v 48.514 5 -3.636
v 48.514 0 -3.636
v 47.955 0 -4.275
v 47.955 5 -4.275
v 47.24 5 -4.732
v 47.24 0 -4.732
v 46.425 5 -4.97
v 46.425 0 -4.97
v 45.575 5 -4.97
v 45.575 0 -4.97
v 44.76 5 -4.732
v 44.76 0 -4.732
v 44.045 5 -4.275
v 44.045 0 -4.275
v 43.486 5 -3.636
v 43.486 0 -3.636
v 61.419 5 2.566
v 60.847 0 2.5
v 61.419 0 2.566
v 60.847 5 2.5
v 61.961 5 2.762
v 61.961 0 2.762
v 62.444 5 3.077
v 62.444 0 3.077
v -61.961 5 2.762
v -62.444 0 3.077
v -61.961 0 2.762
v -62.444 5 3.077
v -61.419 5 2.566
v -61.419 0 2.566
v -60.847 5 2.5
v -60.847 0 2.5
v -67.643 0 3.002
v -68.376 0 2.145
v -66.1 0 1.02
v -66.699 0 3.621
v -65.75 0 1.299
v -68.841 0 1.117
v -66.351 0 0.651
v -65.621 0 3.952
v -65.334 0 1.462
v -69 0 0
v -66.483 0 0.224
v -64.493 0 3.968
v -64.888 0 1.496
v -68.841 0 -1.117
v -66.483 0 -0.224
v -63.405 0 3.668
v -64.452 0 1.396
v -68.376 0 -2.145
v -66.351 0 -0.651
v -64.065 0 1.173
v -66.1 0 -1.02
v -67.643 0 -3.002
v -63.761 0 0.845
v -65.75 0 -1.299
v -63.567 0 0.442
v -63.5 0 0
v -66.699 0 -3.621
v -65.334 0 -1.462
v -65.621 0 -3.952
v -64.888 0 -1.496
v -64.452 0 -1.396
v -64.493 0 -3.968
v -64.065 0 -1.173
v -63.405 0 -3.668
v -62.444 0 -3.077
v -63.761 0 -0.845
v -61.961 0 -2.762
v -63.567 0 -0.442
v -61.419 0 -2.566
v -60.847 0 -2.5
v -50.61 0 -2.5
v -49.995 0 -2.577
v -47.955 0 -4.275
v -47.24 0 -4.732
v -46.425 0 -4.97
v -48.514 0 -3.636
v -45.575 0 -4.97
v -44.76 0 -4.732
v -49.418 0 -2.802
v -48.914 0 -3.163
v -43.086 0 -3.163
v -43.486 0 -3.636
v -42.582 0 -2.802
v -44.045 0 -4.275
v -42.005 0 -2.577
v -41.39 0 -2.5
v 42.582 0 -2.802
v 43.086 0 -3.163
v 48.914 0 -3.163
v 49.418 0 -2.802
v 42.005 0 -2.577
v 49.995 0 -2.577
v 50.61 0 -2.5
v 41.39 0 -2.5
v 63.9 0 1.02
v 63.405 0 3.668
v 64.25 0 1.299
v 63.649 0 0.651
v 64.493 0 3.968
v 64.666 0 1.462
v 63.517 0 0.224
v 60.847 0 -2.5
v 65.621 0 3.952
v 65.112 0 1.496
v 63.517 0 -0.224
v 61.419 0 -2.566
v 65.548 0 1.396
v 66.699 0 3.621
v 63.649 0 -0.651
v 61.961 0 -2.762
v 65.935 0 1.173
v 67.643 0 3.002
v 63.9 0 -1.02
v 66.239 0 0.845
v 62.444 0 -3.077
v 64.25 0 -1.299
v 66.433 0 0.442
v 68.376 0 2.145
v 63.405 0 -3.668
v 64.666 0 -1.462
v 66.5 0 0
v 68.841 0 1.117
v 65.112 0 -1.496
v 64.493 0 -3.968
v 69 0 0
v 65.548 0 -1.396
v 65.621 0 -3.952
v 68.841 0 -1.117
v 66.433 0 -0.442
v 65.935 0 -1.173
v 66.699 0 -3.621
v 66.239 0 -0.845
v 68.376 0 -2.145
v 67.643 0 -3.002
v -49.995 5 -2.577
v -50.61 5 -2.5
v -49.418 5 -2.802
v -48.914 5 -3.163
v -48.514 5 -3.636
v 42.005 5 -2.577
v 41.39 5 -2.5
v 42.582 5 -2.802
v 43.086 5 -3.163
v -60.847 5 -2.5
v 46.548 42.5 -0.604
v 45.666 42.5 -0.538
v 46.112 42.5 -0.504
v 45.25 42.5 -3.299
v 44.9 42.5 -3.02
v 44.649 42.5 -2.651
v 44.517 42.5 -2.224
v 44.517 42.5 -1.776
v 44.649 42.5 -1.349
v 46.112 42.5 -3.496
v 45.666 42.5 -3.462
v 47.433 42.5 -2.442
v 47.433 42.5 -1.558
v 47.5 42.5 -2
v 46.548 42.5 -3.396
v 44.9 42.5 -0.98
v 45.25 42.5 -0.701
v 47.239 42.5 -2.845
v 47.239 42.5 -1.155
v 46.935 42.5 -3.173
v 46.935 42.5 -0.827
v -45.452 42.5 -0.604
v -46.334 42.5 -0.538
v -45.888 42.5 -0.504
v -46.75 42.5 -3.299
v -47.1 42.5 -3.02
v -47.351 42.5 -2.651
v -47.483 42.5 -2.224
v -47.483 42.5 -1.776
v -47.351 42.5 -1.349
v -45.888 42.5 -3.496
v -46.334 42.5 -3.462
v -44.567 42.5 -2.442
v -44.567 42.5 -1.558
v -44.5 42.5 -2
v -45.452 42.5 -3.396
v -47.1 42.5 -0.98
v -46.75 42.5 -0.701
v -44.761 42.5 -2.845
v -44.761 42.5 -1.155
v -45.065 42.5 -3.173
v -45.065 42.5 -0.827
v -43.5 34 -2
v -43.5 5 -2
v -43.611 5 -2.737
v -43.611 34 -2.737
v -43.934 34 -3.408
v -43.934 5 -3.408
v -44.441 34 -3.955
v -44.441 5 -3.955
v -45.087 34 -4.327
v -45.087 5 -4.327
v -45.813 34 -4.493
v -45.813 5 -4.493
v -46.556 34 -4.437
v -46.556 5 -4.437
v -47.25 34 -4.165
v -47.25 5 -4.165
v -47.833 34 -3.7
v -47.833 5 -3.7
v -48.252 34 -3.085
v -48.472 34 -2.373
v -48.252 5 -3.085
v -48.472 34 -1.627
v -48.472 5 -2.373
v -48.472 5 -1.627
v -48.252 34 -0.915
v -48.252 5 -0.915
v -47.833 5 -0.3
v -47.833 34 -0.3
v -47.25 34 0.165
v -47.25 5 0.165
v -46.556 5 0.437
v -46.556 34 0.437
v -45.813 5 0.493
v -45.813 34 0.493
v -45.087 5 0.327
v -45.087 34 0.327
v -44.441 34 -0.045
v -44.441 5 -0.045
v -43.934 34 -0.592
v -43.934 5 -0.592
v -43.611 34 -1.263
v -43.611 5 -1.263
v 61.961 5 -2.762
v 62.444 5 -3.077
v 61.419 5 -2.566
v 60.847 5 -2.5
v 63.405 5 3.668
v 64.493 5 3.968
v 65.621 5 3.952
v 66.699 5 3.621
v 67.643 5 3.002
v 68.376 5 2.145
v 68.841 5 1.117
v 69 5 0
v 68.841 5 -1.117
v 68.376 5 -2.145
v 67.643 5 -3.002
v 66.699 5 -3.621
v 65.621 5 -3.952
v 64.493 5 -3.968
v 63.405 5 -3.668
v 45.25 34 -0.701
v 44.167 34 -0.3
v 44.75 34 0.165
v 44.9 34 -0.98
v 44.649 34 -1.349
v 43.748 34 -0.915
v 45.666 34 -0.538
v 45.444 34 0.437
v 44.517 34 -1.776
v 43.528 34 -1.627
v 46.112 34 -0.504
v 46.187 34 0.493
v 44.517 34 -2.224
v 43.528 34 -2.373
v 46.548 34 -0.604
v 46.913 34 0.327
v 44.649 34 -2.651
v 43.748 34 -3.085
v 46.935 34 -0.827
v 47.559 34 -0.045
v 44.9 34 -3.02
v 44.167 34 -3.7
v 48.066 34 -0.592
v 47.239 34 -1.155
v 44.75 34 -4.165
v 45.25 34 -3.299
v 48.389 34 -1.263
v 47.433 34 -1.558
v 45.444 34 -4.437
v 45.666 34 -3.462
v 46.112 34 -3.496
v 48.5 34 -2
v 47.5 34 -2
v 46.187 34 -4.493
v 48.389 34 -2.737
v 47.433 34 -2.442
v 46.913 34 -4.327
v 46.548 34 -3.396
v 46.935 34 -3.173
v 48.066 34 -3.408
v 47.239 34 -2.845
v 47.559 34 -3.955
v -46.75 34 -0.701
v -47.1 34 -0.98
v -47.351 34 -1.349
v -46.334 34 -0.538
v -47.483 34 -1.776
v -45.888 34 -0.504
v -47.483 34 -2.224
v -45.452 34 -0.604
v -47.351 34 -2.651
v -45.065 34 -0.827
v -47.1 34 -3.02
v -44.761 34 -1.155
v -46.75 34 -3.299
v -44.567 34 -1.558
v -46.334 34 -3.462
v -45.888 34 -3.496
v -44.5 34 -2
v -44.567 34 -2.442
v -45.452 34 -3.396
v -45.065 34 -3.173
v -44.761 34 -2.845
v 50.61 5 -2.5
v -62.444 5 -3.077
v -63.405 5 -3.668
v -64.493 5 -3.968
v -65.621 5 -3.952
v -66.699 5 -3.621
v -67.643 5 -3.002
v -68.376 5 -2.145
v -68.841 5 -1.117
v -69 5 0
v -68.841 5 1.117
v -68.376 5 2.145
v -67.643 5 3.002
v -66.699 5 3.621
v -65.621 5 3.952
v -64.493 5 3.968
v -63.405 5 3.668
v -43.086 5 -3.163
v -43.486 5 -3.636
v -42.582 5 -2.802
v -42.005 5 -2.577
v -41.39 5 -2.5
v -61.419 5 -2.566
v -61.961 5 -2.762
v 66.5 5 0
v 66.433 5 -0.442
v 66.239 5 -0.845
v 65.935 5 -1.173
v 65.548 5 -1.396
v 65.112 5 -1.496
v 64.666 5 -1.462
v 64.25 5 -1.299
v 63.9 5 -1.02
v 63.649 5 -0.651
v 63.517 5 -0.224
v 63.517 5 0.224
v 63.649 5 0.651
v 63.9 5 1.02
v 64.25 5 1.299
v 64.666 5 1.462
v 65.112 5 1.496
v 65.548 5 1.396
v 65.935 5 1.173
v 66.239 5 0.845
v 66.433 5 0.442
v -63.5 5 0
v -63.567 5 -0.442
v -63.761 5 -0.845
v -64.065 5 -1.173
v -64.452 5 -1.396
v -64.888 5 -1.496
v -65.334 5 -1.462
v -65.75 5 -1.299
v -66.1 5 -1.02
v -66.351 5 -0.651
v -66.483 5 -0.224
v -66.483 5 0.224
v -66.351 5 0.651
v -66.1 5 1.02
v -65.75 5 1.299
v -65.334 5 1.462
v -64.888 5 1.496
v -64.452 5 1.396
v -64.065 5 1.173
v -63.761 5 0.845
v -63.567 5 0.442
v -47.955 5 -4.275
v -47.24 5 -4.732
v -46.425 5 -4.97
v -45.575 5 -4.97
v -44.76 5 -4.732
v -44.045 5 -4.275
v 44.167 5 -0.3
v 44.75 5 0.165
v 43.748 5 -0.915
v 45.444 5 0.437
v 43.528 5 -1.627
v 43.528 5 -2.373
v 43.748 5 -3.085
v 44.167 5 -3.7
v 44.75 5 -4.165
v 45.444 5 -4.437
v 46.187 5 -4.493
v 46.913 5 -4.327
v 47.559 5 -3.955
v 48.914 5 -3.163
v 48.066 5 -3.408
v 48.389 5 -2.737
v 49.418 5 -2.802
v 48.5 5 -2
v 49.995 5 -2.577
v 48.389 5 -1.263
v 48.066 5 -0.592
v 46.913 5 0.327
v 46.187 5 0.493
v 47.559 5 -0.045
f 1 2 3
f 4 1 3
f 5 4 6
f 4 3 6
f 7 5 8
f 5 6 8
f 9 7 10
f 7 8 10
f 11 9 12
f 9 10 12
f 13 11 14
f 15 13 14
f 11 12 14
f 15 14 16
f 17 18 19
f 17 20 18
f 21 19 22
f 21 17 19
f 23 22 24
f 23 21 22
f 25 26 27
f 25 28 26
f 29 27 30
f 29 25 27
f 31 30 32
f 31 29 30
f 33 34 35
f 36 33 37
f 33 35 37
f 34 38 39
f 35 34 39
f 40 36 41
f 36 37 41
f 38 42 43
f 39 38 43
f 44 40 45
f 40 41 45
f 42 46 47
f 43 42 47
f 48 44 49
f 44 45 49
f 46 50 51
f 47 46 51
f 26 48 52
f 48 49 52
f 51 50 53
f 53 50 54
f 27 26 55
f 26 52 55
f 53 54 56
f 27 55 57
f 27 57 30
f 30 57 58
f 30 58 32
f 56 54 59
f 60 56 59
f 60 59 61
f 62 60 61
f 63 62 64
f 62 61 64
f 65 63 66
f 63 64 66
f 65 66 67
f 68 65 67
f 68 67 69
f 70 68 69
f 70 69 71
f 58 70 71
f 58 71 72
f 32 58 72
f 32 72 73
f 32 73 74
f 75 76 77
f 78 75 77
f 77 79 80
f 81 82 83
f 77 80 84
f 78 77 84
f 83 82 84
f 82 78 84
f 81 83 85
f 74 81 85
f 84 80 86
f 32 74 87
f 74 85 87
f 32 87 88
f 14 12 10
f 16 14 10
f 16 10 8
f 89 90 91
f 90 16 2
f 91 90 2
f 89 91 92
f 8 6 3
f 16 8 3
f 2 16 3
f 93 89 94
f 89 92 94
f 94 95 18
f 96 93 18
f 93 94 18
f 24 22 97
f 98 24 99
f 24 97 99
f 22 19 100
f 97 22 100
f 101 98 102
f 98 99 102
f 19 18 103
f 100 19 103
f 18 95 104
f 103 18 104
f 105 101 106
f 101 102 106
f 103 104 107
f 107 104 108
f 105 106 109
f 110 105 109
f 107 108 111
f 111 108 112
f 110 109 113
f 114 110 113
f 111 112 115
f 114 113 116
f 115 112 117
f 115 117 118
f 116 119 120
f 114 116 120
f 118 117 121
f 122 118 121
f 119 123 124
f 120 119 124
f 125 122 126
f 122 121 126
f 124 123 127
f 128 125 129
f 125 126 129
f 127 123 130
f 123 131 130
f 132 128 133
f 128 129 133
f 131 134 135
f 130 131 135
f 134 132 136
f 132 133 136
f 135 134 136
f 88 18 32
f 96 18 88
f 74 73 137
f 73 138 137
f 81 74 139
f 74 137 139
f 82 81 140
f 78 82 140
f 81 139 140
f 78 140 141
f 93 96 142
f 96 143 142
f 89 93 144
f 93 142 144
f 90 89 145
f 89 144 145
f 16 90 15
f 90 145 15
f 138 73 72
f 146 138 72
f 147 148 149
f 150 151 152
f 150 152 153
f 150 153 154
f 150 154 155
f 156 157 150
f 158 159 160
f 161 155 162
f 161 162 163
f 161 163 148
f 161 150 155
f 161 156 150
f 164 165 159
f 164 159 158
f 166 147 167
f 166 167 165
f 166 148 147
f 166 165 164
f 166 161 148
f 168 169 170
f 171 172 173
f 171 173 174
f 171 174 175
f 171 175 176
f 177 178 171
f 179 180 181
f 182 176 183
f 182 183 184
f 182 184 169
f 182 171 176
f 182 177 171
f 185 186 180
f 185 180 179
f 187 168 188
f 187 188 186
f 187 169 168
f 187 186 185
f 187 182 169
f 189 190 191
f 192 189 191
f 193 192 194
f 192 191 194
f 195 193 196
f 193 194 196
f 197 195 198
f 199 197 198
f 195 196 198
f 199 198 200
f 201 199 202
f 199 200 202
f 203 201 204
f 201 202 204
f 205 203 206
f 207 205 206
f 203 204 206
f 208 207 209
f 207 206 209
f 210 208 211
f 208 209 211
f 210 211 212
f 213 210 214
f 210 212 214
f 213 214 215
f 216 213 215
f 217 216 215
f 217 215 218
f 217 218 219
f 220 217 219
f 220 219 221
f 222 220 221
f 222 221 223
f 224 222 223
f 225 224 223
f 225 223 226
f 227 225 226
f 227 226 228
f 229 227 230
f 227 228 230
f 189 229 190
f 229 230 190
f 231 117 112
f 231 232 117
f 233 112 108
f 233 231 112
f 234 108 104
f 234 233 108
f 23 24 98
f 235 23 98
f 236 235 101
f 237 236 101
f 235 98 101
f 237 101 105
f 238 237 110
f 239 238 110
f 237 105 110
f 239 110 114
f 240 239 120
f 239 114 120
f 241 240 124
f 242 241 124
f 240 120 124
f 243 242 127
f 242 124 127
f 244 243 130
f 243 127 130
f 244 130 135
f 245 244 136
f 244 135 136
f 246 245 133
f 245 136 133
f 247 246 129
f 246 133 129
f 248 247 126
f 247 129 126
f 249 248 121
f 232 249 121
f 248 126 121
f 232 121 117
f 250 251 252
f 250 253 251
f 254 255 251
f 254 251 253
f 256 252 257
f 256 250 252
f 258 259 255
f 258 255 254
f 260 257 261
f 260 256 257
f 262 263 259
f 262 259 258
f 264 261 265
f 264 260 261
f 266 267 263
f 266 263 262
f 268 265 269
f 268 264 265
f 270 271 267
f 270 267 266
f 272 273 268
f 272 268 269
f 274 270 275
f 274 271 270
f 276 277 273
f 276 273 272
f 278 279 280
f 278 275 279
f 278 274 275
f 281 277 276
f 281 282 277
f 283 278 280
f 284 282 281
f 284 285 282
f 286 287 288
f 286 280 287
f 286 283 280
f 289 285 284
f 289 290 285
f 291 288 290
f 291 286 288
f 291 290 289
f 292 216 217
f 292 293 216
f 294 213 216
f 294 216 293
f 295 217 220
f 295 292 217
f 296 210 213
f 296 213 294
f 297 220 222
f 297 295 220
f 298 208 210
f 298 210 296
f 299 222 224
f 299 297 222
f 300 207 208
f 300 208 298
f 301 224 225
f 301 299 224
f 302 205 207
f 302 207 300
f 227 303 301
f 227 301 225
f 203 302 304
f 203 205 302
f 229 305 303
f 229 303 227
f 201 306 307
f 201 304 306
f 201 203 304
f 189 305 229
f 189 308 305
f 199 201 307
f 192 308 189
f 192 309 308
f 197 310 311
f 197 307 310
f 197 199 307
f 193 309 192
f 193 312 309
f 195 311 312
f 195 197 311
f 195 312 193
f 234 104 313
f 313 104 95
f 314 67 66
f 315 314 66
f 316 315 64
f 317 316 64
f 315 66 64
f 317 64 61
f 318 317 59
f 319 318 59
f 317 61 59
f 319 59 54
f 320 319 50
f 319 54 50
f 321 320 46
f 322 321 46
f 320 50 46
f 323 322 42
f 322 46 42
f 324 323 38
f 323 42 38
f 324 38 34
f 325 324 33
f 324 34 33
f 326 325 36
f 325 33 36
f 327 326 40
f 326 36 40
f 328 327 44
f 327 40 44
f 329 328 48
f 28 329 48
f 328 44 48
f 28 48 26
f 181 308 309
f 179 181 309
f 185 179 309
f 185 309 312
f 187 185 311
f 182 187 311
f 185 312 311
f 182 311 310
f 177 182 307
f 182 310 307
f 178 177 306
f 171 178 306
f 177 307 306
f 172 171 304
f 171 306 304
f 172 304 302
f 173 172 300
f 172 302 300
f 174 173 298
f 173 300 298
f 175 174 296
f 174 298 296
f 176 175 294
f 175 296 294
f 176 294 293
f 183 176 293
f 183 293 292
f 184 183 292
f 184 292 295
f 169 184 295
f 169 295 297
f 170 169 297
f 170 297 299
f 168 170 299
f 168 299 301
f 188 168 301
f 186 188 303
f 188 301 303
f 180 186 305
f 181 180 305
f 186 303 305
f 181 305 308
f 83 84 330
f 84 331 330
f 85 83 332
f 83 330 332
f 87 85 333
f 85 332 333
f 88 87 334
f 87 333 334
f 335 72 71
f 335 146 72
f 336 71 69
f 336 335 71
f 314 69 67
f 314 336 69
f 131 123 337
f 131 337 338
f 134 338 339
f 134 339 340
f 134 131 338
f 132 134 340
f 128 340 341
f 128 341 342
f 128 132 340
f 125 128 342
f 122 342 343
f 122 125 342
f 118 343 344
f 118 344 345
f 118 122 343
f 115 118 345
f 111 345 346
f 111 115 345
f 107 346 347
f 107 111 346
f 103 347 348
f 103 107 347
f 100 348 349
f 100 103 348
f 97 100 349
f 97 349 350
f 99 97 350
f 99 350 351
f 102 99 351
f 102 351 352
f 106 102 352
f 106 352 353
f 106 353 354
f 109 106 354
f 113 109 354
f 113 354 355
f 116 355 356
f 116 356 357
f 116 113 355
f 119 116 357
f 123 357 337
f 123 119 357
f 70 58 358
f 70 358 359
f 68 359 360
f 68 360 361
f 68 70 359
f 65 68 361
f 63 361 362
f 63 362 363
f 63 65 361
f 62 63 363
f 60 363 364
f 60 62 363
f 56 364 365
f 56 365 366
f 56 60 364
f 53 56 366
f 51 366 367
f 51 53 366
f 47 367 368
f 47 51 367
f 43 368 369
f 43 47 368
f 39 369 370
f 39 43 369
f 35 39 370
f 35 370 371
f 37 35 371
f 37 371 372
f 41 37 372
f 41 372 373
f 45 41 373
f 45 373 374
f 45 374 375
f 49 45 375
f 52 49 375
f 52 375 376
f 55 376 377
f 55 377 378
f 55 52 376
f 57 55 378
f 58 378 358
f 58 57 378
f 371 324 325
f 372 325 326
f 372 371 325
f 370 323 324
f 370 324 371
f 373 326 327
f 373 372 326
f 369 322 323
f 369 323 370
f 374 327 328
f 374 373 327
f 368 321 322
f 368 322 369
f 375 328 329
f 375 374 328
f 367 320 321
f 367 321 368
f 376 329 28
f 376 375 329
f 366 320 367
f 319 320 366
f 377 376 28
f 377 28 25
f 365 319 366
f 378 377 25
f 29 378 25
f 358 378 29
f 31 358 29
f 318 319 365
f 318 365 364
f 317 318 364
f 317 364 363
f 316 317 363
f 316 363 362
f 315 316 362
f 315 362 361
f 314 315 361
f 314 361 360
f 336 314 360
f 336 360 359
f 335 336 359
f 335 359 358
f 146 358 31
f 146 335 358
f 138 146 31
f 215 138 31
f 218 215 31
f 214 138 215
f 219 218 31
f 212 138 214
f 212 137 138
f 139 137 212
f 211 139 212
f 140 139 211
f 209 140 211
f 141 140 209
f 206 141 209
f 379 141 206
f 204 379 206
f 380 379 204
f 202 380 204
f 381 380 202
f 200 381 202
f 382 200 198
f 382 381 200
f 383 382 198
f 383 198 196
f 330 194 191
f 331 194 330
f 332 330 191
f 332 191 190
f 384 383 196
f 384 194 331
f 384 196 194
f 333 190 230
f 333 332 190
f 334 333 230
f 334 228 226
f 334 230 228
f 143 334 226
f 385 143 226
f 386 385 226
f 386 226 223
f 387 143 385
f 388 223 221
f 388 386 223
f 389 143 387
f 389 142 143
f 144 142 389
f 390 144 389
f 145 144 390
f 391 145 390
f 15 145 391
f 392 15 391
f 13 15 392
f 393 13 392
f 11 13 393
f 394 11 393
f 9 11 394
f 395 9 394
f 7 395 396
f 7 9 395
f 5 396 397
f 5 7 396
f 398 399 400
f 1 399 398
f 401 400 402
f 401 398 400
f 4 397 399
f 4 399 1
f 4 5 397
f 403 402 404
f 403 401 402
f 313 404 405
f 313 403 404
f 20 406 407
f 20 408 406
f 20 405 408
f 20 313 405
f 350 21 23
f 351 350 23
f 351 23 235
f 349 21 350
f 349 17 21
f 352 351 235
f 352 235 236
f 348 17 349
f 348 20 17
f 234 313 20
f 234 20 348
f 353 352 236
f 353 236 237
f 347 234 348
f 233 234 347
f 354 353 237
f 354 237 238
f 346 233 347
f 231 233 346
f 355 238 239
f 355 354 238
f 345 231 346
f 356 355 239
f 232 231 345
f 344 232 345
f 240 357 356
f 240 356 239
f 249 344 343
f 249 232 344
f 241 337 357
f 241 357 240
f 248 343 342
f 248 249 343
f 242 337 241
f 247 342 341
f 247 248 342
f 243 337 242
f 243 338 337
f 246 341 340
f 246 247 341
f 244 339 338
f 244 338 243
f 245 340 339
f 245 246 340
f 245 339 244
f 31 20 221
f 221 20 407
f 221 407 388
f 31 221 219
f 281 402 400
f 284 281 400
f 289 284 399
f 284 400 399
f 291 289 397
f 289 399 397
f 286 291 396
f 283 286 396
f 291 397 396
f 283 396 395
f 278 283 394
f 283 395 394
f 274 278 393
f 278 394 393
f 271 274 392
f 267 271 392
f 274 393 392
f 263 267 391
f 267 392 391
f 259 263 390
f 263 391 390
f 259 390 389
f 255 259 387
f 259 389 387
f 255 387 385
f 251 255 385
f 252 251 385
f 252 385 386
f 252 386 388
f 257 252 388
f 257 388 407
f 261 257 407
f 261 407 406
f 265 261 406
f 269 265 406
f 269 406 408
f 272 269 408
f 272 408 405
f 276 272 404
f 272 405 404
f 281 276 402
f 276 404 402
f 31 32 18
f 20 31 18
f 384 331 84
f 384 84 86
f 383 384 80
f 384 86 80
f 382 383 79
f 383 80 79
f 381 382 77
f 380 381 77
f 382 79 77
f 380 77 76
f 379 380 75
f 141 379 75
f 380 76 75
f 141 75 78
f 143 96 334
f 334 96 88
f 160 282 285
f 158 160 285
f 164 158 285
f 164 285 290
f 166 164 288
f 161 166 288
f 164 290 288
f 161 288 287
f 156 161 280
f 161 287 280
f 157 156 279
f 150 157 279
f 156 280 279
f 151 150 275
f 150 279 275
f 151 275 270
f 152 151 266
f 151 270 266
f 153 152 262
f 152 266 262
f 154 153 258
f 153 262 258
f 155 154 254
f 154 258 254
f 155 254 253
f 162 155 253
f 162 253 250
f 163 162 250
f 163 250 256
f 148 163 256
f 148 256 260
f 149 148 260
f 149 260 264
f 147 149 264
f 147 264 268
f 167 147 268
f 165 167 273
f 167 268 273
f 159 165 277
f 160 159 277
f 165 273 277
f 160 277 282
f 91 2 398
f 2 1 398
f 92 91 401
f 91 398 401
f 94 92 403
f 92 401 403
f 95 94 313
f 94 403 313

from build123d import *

# Parameters (mm, degrees)
SKETCH1_R           = 1.5
BOSS_EXTRUDE1_DEPTH = 5
FILLET1_R           = 2.5
SKETCH2_R           = 2.5
BOSS_EXTRUDE2_DEPTH = 29
SKETCH3_R           = 1.5
BOSS_EXTRUDE3_DEPTH = 8.5


with BuildPart() as part:
    # Sketch1 → Boss-Extrude1 (new body)
    with BuildSketch(Plane(origin=(0, 0, 0), x_dir=(1, 0, 0), z_dir=(0, 1, 0))):
        with BuildLine():
            Line((-48.958039892, 2.5), (-61.877501001, 2.5))
            ThreePointArc((-61.877501001, 2.5), (-69, 0), (-61.877501001, -2.5))
            Line((-61.877501001, -2.5), (61.877501001, -2.5))
            ThreePointArc((61.877501001, -2.5), (69, 0), (61.877501001, 2.5))
            Line((61.877501001, 2.5), (48.958039892, 2.5))
            ThreePointArc((48.958039892, 2.5), (46, 5), (43.041960108, 2.5))
            Line((43.041960108, 2.5), (-43.041960108, 2.5))
            ThreePointArc((-43.041960108, 2.5), (-46, 5), (-48.958039892, 2.5))
        make_face()
        with Locations((-65, 0)):
            Circle(SKETCH1_R, mode=Mode.SUBTRACT)
        with Locations((65, 0)):
            Circle(SKETCH1_R, mode=Mode.SUBTRACT)
    extrude(amount=BOSS_EXTRUDE1_DEPTH)

    # Fillet1
    fillet1_edges = [part.edges().sort_by_distance(p)[0] for p in [
        (61.877501001, 2.5, -2.5),
        (61.877501001, 2.5, 2.5),
        (-61.877501001, 2.5, 2.5),
        (-61.877501001, 2.5, -2.5),
        (-48.958039892, 2.5, -2.5),
        (-43.041960108, 2.5, -2.5),
        (43.041960108, 2.5, -2.5),
        (48.958039892, 2.5, -2.5),
    ]]
    fillet(fillet1_edges, radius=FILLET1_R)

    # Sketch2 → Boss-Extrude2 (add)
    with BuildSketch(Plane(origin=(0, 5, 0), x_dir=(1, 0, 0), z_dir=(0, 1, 0))):
        with Locations((-46, 2)):
            Circle(SKETCH2_R)
        with Locations((46, 2)):
            Circle(SKETCH2_R)
    extrude(amount=BOSS_EXTRUDE2_DEPTH)

    # Sketch3 → Boss-Extrude3 (add)
    with BuildSketch(Plane(origin=(0, 34, 0), x_dir=(1, 0, 0), z_dir=(0, 1, 0))):
        with Locations((-46, 2)):
            Circle(SKETCH3_R)
        with Locations((46, 2)):
            Circle(SKETCH3_R)
    extrude(amount=BOSS_EXTRUDE3_DEPTH)


solid = part.part
